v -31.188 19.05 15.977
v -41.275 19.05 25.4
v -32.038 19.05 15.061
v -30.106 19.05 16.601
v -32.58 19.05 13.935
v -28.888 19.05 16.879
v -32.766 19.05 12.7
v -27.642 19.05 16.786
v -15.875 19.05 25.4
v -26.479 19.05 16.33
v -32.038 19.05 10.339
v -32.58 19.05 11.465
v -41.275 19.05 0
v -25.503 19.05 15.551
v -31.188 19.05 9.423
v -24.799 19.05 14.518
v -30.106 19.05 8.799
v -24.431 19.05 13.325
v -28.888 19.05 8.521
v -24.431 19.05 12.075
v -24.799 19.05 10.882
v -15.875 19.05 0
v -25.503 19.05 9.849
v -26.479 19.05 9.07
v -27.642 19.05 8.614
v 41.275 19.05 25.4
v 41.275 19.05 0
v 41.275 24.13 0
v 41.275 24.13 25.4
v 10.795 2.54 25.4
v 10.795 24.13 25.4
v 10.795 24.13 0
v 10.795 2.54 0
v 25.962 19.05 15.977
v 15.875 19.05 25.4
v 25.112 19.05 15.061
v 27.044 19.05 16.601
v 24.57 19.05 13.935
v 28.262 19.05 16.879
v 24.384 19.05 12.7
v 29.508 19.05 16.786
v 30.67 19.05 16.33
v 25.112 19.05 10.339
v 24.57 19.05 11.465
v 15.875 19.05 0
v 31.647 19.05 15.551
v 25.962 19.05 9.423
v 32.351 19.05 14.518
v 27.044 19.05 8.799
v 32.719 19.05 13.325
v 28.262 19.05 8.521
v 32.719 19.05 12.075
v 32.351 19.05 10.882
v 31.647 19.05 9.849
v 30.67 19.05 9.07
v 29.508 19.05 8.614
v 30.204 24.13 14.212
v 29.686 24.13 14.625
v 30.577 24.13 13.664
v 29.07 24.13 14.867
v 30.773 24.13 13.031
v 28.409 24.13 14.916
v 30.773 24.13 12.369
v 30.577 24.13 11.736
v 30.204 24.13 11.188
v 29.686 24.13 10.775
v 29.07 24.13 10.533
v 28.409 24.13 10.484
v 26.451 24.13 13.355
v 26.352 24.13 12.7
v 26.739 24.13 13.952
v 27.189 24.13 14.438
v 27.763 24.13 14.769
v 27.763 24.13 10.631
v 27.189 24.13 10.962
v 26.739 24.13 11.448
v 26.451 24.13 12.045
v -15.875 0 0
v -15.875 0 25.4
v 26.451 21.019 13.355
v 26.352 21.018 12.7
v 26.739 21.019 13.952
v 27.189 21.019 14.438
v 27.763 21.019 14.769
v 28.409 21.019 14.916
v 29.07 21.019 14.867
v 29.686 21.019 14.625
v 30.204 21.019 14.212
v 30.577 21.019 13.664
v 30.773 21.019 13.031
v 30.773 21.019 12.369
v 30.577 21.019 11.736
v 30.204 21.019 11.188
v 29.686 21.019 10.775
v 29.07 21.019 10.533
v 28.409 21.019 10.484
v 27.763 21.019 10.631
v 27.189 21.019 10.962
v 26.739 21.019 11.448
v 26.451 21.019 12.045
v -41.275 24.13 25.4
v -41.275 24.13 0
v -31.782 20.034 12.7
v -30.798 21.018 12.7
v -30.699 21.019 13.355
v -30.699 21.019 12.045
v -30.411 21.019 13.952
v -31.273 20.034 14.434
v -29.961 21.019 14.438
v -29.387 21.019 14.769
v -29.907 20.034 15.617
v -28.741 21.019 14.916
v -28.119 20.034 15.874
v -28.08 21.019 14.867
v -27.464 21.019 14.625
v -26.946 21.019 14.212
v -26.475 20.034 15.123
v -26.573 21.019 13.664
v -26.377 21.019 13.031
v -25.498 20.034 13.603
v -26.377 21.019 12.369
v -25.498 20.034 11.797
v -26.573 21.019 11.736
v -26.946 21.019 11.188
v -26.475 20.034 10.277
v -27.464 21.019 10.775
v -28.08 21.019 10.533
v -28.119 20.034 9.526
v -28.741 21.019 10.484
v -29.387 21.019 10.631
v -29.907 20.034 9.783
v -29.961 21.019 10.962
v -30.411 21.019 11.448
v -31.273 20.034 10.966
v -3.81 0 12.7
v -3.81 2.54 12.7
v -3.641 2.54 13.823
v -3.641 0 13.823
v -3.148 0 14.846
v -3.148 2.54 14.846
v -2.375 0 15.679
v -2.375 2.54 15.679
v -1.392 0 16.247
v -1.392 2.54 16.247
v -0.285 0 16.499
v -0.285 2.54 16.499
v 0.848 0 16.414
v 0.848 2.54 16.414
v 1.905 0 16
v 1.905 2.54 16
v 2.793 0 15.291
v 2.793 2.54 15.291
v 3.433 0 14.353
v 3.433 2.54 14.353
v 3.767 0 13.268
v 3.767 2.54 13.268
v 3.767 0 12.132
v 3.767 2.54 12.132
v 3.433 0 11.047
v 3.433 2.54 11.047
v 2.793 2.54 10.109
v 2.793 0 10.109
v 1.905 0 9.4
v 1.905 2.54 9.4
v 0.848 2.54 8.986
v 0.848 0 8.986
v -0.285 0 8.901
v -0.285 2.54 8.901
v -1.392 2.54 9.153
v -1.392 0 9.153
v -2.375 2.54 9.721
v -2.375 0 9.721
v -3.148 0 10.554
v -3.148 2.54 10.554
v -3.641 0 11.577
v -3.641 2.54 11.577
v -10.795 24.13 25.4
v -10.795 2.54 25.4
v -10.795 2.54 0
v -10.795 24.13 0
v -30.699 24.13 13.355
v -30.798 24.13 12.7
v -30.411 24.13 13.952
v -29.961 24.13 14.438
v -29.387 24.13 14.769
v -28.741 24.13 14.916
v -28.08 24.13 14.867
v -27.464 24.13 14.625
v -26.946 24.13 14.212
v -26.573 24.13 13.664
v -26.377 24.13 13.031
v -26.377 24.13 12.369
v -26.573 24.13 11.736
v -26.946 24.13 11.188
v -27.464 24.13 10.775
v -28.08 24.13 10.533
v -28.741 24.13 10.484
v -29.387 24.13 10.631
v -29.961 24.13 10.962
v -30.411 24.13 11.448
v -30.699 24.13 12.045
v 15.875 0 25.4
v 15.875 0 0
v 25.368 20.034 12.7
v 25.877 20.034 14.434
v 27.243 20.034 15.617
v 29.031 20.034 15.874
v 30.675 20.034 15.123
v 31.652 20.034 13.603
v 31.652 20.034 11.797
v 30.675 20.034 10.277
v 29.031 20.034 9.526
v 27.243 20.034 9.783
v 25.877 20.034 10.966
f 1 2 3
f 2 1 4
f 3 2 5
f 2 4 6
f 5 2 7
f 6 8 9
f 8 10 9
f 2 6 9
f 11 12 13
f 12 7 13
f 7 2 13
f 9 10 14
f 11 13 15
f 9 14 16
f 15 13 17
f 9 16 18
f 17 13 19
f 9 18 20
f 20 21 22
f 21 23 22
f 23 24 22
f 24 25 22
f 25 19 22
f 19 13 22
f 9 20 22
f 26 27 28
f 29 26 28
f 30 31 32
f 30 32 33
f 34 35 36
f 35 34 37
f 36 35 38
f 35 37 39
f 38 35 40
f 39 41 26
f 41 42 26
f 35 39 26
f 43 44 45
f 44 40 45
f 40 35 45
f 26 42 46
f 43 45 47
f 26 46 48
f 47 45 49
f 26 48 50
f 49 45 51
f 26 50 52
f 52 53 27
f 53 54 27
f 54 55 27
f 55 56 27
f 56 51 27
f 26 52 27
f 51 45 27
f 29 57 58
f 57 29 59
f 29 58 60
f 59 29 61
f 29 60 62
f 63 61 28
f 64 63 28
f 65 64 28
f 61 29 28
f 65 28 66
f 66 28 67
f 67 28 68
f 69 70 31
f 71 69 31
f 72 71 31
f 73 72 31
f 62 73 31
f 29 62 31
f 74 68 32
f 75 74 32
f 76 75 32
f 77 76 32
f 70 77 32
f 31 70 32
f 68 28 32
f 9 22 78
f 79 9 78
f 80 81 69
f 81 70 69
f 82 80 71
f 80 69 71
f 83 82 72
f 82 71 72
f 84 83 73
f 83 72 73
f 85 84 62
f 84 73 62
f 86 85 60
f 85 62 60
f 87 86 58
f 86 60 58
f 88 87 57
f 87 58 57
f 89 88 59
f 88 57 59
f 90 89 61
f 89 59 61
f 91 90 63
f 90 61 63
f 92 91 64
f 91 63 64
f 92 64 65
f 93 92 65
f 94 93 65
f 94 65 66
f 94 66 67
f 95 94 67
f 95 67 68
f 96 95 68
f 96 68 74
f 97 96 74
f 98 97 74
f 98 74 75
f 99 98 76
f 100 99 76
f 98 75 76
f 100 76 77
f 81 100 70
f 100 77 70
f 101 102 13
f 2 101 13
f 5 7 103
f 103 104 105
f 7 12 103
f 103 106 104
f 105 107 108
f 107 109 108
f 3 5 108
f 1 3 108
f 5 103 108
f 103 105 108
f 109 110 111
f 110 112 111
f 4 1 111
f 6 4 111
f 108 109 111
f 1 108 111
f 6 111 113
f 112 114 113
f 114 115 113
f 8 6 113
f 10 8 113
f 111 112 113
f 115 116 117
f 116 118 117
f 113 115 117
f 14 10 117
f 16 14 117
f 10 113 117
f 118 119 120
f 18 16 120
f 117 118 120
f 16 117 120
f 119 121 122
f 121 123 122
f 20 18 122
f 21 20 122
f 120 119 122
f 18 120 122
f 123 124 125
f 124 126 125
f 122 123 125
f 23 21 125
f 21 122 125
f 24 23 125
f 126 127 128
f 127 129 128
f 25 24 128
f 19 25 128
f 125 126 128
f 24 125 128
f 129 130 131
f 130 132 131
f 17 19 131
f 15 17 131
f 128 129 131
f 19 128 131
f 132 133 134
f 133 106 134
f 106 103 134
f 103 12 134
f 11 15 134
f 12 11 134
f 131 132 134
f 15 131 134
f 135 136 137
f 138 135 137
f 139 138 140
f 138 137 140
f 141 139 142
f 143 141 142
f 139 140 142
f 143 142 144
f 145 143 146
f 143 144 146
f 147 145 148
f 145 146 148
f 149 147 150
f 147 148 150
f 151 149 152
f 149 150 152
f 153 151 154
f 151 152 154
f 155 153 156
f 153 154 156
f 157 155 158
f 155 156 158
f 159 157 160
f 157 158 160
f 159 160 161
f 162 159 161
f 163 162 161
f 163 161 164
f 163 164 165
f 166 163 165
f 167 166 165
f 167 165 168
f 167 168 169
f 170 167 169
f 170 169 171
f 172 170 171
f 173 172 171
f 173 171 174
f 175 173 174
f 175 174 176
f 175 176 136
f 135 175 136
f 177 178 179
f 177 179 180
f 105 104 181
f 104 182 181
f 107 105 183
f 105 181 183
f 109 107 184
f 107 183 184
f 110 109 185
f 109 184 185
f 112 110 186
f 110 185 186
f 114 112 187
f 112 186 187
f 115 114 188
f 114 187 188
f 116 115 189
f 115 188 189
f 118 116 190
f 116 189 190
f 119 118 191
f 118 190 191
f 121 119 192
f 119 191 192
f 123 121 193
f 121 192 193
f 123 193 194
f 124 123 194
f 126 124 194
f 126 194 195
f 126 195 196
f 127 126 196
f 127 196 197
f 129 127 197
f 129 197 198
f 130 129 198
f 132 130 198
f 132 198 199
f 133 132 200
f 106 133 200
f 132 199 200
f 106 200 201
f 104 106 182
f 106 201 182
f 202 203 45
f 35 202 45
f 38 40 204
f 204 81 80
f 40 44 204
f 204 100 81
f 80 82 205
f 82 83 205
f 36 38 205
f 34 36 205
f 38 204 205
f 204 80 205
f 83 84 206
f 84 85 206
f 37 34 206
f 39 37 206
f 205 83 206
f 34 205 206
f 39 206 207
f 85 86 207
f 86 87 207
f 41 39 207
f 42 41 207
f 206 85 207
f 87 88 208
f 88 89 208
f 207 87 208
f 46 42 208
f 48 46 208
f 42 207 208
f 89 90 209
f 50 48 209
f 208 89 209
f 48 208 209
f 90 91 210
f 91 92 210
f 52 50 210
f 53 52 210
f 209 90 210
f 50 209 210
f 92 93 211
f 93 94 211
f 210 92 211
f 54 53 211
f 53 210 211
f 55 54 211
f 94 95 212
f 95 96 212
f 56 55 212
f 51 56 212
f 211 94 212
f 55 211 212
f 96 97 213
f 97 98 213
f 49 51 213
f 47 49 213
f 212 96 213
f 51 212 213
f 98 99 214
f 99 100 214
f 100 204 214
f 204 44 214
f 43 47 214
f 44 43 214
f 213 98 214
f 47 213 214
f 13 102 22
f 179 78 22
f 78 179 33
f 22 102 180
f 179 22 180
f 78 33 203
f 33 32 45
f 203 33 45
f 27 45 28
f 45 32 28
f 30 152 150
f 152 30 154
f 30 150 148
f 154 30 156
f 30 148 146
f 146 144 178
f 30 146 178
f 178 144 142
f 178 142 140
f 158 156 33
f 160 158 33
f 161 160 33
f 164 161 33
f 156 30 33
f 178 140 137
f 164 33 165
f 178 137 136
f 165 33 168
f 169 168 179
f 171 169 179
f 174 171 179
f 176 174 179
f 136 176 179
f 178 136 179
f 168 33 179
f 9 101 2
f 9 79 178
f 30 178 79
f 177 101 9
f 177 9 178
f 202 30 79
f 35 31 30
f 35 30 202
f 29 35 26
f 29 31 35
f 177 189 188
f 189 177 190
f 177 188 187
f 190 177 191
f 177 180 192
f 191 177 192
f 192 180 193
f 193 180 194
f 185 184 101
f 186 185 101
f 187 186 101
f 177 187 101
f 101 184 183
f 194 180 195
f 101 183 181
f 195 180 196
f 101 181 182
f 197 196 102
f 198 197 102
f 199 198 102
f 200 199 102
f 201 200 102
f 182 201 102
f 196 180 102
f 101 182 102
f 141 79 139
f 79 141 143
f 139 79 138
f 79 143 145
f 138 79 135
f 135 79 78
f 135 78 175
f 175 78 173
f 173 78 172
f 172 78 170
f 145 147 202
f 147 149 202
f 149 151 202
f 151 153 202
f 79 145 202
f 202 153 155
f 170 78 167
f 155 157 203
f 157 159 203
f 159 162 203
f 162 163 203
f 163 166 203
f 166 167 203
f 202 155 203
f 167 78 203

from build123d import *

# Parameters (mm, degrees)
F1_DEPTH       = 25.4
F3_D           = 7.62
F6_D           = 4.445
F6_CSINK_D     = 8.382
F6_CSINK_ANGLE = 90
F7_D           = 4.445
F7_CSINK_D     = 8.382
F7_CSINK_ANGLE = 90


with BuildPart() as f1:
    # F0 (on Top) → F1 (new body)
    with BuildSketch(Plane.XY):
        Polygon((-10.795, 24.13), (-41.275, 24.13), (-41.275, 19.05), (-15.875, 19.05), (-15.875, 0), (15.875, 0), (15.875, 19.05), (41.275, 19.05), (41.275, 24.13), (10.795, 24.13), (10.795, 2.54), (-10.795, 2.54), align=None)
    extrude(amount=F1_DEPTH)

    # F3 (through all)
    with Locations(Plane.XZ):
        with Locations((0, 12.7)):
            Hole(F3_D / 2)

    # F6 (through all)
    with Locations(Plane.XZ.offset(-19.05)):
        with Locations((-28.575, 12.7)):
            CounterSinkHole(F6_D / 2, F6_CSINK_D / 2, counter_sink_angle=F6_CSINK_ANGLE)

    # F7 (through all)
    with Locations(Plane.XZ.offset(-19.05)):
        with Locations((28.575, 12.7)):
            CounterSinkHole(F7_D / 2, F7_CSINK_D / 2, counter_sink_angle=F7_CSINK_ANGLE)


solid = f1.part
